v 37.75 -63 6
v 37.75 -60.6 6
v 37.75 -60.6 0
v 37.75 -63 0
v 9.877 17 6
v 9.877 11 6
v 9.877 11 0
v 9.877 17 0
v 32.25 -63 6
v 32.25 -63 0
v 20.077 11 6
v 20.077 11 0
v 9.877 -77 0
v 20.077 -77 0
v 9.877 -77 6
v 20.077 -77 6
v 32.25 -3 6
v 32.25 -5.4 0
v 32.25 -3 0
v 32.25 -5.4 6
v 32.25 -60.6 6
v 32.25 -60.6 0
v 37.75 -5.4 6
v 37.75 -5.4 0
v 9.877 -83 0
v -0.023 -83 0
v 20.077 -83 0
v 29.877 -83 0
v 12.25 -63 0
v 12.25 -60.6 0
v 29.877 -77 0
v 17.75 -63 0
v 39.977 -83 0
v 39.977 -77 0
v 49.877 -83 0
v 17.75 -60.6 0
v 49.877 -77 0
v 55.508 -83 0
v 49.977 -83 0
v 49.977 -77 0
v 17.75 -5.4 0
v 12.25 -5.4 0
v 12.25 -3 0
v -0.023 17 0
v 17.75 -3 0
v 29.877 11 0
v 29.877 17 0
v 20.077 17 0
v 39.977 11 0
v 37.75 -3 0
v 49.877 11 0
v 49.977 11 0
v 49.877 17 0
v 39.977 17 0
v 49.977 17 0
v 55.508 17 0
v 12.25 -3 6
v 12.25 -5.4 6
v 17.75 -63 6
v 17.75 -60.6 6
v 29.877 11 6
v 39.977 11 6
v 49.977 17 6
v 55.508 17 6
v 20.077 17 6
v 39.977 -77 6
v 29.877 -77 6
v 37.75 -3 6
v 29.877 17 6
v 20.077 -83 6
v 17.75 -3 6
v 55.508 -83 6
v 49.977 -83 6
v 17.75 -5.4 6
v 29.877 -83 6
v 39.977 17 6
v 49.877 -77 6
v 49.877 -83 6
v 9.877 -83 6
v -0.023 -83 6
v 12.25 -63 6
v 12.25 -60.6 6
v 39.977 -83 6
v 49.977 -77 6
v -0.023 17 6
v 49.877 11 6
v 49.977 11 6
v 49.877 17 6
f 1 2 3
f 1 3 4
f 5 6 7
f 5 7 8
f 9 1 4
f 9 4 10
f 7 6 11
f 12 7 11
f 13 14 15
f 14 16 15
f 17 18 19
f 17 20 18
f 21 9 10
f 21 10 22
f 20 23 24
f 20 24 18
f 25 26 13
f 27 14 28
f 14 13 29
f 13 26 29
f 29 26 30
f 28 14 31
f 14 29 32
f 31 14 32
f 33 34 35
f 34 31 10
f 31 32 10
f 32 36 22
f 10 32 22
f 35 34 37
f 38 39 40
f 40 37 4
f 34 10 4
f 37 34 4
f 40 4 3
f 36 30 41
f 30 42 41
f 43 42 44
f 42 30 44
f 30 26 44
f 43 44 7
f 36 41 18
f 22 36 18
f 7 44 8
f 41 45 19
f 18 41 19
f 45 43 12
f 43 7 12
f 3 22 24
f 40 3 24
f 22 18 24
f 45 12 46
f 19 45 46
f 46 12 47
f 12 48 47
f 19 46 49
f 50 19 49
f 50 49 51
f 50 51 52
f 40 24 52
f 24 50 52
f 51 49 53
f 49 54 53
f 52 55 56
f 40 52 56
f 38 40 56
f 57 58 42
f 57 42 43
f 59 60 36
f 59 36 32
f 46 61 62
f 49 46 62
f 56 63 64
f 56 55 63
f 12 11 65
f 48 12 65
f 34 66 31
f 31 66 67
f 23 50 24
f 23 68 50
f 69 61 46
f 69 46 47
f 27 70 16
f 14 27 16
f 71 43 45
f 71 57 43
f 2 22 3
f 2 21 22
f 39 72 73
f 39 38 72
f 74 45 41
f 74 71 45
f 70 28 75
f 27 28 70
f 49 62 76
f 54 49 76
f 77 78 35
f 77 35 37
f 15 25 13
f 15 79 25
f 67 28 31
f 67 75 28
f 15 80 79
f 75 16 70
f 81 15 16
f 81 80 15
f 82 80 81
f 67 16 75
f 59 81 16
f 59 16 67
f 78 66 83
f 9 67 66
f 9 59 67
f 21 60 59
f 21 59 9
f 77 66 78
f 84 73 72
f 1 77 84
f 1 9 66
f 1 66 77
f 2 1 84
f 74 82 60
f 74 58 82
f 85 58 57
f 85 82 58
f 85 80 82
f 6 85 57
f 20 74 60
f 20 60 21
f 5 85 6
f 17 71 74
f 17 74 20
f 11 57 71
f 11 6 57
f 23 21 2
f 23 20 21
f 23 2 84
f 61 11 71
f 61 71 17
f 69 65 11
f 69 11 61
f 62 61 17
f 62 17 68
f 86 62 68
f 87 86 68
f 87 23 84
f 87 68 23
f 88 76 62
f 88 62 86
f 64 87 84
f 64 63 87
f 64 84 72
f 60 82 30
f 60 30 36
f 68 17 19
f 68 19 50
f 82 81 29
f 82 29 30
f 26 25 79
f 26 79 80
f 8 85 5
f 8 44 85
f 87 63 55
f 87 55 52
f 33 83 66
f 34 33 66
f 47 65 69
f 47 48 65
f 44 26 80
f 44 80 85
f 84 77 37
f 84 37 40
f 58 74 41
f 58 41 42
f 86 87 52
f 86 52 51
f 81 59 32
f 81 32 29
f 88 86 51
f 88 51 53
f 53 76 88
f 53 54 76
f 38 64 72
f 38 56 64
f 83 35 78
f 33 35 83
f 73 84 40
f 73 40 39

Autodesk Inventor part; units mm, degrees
ref_plane "YZ Plane" through (0, 0, 0) normal (1, 0, 0) x (0, 1, 0)
ref_plane "XZ Plane" through (0, 0, 0) normal (0, 1, 0) x (-1, 0, 0)
ref_plane "XY Plane" through (0, 0, 0) normal (0, 0, 1) x (1, 0, 0)
sketch "Sketch1" plane through (0, 0, 0) normal (0, 0, 1) x (1, 0, 0)
  line L0 (49.9773, 11) -> (55.5082, 11) projected
  line L1 (-0.0227, 11) -> (-0.0227, 17) projected
  line L2 (-0.0227, 11) -> (-0.0227, 17) projected
  line L3 (-0.0227, 11) -> (-0.0227, 17) projected
  line L4 (-0.0227, 17) -> (55.5082, 17)
  line L5 (55.5082, 17) -> (55.5082, -83)
  line L6 (55.5082, -83) -> (-0.0227, -83)
  line L7 (-0.0227, -83) -> (-0.0227, 17)
  line L8 (55.5082, 17) -> (55.5082, 11) projected
  line L9 (55.5082, 17) -> (55.5082, 11) projected
  dimension "d16" = 100
extrude "Extrusion1" add sketch "Sketch1" along normal blind 6
sketch "Sketch2" plane through (0, 0, 6) normal (0, 0, 1) x (1, 0, 0)
  line L0 (49.9773, 11) -> (55.5082, 11) projected
  line L1 (49.9773, 17) -> (49.9773, 11) projected
  line L2 (29.9773, 17) -> (29.9773, 11) projected
  line L3 (29.9773, 11) -> (39.9773, 11) projected
  line L4 (39.9773, 11) -> (39.9773, 17) projected
  line L5 (49.9773, 11) -> (49.8773, 11)
  line L6 (49.8773, 11) -> (49.8773, 17)
  line L7 (49.8773, 17) -> (49.9773, 17)
  line L8 (49.9773, 17) -> (49.9773, 11)
  line L9 (39.9773, 11) -> (40.0773, 11)
  line L10 (40.0773, 11) -> (40.0773, 17)
  line L11 (40.0773, 17) -> (39.9773, 17)
  line L12 (39.9773, 17) -> (39.9773, 11)
  line L13 (29.9773, 11) -> (29.8773, 11)
  line L14 (29.8773, 11) -> (29.8773, 17)
  line L15 (29.8773, 17) -> (29.9773, 17)
  line L16 (29.9773, 17) -> (29.9773, 11)
  line L17 (9.9773, 17) -> (9.9773, 11) projected
  line L18 (19.9773, 11) -> (19.9773, 17) projected
  line L19 (9.9773, 11) -> (19.9773, 11) projected
  line L20 (19.9773, 11) -> (20.0773, 11)
  line L21 (20.0773, 11) -> (20.0773, 17)
  line L22 (20.0773, 17) -> (19.9773, 17)
  line L23 (19.9773, 17) -> (19.9773, 11)
  line L24 (9.9773, 11) -> (9.8773, 11)
  line L25 (9.8773, 11) -> (9.8773, 17)
  line L26 (9.8773, 17) -> (9.9773, 17)
  line L27 (9.9773, 17) -> (9.9773, 11)
  line L28 (55.5082, -83) -> (55.5082, 17) projected
  line L29 (39.9773, 11) -> (29.9773, 11)
  line L30 (19.9773, 11) -> (9.9773, 11)
  line L31 (49.9773, 11) -> (55.5082, 11)
  line L32 (-0.0227, 17) -> (-0.0227, -83) projected
  line L33 (55.5082, 17) -> (-0.0227, 17)
  point P0 (49.9, 0.06)
  point P1 (30.1, 0)
  point P2 (39.9, 0)
  point P3 (39.9, 0.03)
  point P4 (30.1, 2.97)
  point P5 (40, 0)
  point P6 (40, 0)
  point P7 (9.9773, 17)
  point P8 (19.9773, 17)
  point P9 (9.9773, 17)
  point P10 (39.9773, 17)
  point P11 (29.9773, 17)
  point P12 (49.9773, 17)
  dimension "d3" = 0.1
  dimension "d4" = 6
  dimension "d5" = 0.1
  dimension "d6" = 6
  dimension "d7" = 0.1
  dimension "d8" = 6
  dimension "d17" = 0.1
  dimension "d18" = 6
  dimension "d19" = 0.1
  dimension "d20" = 6
extrude "Extrusion2" cut sketch "Sketch2" against normal through all contours L5 L6 L7 L1 | L21 L20 L18 L22 | L4 L3 L2 L33 | L2 L13 L14 L15 | L18 L19 L17 L33 | L17 L24 L25 L26
ref_plane "Work Plane1" through (-0.0227, -33, 0) normal (0, -1, 0) x (1, 0, 0)
mirror "Mirror1" about plane through (-0.0227, -33, 0) normal (0, -1, 0) of "Extrusion2"
sketch "Sketch3" plane through (0, 0, 6) normal (0, 0, 1) x (1, 0, 0)
  line L0 (37.75, -5.4) -> (32.25, -5.4)
  line L1 (32.25, -5.4) -> (32.25, -3)
  line L2 (32.25, -3) -> (37.75, -3)
  line L3 (37.75, -3) -> (37.75, -5.4)
  line L4 (40.1, 7.6673) -> (40.1, 6) projected
  line L5 (40.1, 0) -> (29.9, 0) projected
  point P0 (0, 0)
  dimension "d21" = 5.5
  dimension "d22" = 2.4
  dimension "d23" = 2.35
  dimension "d24" = 3
extrude "Extrusion3" cut sketch "Sketch3" against normal through all
pattern_linear "Rectangular Pattern1" count 2 spacing 20 along (-1, 0, 0) of "Extrusion3"
mirror "Mirror2" about plane through (-0.0227, -33, 0) normal (0, -1, 0) of "Extrusion3", "Rectangular Pattern1"
properties part number "00_Baseplate_Simmo_side6_v2"
